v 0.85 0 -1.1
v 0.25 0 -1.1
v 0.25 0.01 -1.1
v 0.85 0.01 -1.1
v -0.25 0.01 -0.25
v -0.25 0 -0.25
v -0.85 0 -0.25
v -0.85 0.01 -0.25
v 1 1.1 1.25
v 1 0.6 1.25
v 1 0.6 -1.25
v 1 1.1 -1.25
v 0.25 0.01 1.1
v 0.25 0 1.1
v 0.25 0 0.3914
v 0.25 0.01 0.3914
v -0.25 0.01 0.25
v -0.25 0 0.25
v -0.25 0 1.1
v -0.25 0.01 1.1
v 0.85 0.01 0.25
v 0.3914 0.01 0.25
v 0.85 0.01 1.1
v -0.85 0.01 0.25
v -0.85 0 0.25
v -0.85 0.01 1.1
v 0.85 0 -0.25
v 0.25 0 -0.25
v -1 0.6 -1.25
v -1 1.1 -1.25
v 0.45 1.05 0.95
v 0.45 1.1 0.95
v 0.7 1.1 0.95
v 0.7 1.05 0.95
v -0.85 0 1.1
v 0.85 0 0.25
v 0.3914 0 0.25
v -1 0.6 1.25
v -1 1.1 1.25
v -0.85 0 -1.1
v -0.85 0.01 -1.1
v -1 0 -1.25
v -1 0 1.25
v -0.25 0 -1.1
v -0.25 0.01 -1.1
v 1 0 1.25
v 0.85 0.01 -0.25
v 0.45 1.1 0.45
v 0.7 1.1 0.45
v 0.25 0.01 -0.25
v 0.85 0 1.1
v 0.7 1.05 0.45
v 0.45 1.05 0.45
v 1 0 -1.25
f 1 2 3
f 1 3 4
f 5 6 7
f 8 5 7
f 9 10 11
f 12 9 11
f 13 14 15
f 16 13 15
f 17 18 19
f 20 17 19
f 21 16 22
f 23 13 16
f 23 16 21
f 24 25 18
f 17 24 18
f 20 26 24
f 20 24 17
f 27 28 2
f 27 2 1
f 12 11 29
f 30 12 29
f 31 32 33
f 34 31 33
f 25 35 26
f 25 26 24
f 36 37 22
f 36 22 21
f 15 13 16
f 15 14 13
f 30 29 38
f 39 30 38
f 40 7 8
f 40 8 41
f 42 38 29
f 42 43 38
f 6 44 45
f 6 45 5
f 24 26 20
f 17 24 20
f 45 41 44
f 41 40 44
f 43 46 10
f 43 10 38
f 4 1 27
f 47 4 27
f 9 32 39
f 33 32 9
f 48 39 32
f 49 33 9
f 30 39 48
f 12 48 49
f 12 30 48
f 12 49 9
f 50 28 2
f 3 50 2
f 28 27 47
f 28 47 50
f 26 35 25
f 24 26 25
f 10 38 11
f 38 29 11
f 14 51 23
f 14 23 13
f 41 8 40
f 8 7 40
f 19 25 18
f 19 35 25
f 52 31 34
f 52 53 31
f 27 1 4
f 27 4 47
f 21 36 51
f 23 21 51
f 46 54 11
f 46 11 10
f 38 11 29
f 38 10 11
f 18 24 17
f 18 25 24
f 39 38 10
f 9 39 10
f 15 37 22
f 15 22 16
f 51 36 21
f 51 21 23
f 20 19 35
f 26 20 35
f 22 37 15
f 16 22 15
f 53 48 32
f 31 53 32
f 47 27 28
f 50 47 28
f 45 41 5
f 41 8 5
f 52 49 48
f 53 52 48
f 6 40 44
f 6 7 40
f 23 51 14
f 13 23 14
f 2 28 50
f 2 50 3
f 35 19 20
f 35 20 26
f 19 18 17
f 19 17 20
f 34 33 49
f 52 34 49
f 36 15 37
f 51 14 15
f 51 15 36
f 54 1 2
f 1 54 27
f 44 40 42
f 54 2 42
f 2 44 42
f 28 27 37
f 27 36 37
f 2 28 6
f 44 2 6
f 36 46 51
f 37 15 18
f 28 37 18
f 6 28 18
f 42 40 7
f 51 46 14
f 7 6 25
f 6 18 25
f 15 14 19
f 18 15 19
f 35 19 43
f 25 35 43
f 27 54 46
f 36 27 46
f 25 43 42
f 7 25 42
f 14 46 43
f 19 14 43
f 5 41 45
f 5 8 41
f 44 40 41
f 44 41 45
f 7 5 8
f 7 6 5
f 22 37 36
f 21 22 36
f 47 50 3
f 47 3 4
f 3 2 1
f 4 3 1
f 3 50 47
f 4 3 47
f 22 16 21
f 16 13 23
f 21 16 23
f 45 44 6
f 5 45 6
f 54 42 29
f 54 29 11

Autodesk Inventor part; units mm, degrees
ref_plane "YZ Plane" through (0, 0, 0) normal (1, 0, 0) x (0, 1, 0)
ref_plane "XZ Plane" through (0, 0, 0) normal (0, 1, 0) x (-1, 0, 0)
ref_plane "XY Plane" through (0, 0, 0) normal (0, 0, 1) x (1, 0, 0)
sketch "Sketch1" plane through (0, 0, 0) normal (0, 1, 0) x (-1, 0, 0)
  line L0 (-1, 1.25) -> (1, 1.25)
  line L1 (1, 1.25) -> (1, -1.25)
  line L2 (1, -1.25) -> (-1, -1.25)
  line L3 (-1, -1.25) -> (-1, 1.25)
  line L4 (-1, 1.25) -> (1, -1.25) construction
  line L5 (1, 1.25) -> (-1, -1.25) construction
  point P0 (0, 0)
  dimension "d0" = 2
  dimension "d1" = 2.5
extrude "Extrusion1" add sketch "Sketch1" along normal blind 0.6
sketch "Sketch2" plane through (0, 0.6, 0) normal (0, 1, 0) x (1, 0, 0)
  line L0 (-1, 1.25) -> (-1, -1.25) projected
  line L1 (-1, -1.25) -> (1, -1.25) projected
  line L2 (1, -1.25) -> (1, 1.25) projected
  line L3 (1, 1.25) -> (-1, 1.25) projected
  point P0 (0, 0)
extrude "Extrusion2" add sketch "Sketch2" along normal blind 0.5 separate body
sketch "Sketch3" plane through (0, 0, 0) normal (0, -1, 0) x (1, 0, 0)
  line L0 (0.85, 1.1) -> (0.25, 1.1)
  line L1 (0.25, 1.1) -> (0.25, 0.3914)
  line L2 (0.3914, 0.25) -> (0.85, 0.25)
  line L3 (0.85, 0.25) -> (0.85, 1.1)
  line L4 (-0.25, 1.1) -> (-0.85, 1.1)
  line L5 (-0.85, 1.1) -> (-0.85, 0.25)
  line L6 (-0.85, 0.25) -> (-0.25, 0.25)
  line L7 (-0.25, 0.25) -> (-0.25, 1.1)
  line L8 (-0.25, -0.25) -> (-0.85, -0.25)
  line L9 (-0.85, -0.25) -> (-0.85, -1.1)
  line L10 (-0.85, -1.1) -> (-0.25, -1.1)
  line L11 (-0.25, -1.1) -> (-0.25, -0.25)
  line L12 (0.85, -0.25) -> (0.25, -0.25)
  line L13 (0.25, -0.25) -> (0.25, -1.1)
  line L14 (0.25, -1.1) -> (0.85, -1.1)
  line L15 (0.85, -1.1) -> (0.85, -0.25)
  line L16 (0.3914, 0.25) -> (0.25, 0.3914)
  line L17 (1, 1.25) -> (-1, 1.25) projected
  line L18 (-1, 1.25) -> (-1, -1.25) projected
  line L19 (-1, -1.25) -> (1, -1.25) projected
  line L20 (1, -1.25) -> (1, 1.25) projected
  point P0 (0, 0)
  dimension "d6" = 0.15
  dimension "d7" = 0.15
  dimension "d8" = 0.15
  dimension "d9" = 0.15
  dimension "d10" = 0.15
  dimension "d11" = 0.15
  dimension "d12" = 0.15
  dimension "d13" = 0.85
  dimension "d14" = 0.85
  dimension "d15" = 0.85
  dimension "d16" = 0.85
  dimension "d17" = 0.6
  dimension "d18" = 0.6
  dimension "d19" = 0.2
  dimension "d20" = 135
extrude "Extrusion3" cut sketch "Sketch3" against normal blind 0.01 contours L3 L2 L16 L1 L0 | L7 L6 L5 L4 | L11 L10 L9 L8 | L15 L14 L13 L12 bodies 1
extrude "Extrusion4" add sketch "Sketch3" against normal blind 0.01 separate body contours L3 L2 L16 L1 L0 | L7 L6 L5 L4 | L11 L10 L9 L8 | L15 L14 L13 L12
sketch "Sketch4" plane through (0, 1.1, 0) normal (0, 1, 0) x (1, 0, 0)
  line L0 (0.45, -0.95) -> (0.7, -0.95)
  line L1 (0.7, -0.95) -> (0.7, -0.45)
  line L2 (0.7, -0.45) -> (0.45, -0.45)
  line L3 (0.45, -0.45) -> (0.45, -0.95)
  line L4 (1, -1.25) -> (1, 1.25) projected
  line L5 (-1, -1.25) -> (1, -1.25) projected
  point P0 (0, 0)
  dimension "d25" = 0.3
  dimension "d26" = 0.3
  dimension "d27" = 0.5
  dimension "d28" = 0.25
extrude "Extrusion5" cut sketch "Sketch4" against normal blind 0.05 bodies 2
properties part number "LXDC2HN18A-097"
